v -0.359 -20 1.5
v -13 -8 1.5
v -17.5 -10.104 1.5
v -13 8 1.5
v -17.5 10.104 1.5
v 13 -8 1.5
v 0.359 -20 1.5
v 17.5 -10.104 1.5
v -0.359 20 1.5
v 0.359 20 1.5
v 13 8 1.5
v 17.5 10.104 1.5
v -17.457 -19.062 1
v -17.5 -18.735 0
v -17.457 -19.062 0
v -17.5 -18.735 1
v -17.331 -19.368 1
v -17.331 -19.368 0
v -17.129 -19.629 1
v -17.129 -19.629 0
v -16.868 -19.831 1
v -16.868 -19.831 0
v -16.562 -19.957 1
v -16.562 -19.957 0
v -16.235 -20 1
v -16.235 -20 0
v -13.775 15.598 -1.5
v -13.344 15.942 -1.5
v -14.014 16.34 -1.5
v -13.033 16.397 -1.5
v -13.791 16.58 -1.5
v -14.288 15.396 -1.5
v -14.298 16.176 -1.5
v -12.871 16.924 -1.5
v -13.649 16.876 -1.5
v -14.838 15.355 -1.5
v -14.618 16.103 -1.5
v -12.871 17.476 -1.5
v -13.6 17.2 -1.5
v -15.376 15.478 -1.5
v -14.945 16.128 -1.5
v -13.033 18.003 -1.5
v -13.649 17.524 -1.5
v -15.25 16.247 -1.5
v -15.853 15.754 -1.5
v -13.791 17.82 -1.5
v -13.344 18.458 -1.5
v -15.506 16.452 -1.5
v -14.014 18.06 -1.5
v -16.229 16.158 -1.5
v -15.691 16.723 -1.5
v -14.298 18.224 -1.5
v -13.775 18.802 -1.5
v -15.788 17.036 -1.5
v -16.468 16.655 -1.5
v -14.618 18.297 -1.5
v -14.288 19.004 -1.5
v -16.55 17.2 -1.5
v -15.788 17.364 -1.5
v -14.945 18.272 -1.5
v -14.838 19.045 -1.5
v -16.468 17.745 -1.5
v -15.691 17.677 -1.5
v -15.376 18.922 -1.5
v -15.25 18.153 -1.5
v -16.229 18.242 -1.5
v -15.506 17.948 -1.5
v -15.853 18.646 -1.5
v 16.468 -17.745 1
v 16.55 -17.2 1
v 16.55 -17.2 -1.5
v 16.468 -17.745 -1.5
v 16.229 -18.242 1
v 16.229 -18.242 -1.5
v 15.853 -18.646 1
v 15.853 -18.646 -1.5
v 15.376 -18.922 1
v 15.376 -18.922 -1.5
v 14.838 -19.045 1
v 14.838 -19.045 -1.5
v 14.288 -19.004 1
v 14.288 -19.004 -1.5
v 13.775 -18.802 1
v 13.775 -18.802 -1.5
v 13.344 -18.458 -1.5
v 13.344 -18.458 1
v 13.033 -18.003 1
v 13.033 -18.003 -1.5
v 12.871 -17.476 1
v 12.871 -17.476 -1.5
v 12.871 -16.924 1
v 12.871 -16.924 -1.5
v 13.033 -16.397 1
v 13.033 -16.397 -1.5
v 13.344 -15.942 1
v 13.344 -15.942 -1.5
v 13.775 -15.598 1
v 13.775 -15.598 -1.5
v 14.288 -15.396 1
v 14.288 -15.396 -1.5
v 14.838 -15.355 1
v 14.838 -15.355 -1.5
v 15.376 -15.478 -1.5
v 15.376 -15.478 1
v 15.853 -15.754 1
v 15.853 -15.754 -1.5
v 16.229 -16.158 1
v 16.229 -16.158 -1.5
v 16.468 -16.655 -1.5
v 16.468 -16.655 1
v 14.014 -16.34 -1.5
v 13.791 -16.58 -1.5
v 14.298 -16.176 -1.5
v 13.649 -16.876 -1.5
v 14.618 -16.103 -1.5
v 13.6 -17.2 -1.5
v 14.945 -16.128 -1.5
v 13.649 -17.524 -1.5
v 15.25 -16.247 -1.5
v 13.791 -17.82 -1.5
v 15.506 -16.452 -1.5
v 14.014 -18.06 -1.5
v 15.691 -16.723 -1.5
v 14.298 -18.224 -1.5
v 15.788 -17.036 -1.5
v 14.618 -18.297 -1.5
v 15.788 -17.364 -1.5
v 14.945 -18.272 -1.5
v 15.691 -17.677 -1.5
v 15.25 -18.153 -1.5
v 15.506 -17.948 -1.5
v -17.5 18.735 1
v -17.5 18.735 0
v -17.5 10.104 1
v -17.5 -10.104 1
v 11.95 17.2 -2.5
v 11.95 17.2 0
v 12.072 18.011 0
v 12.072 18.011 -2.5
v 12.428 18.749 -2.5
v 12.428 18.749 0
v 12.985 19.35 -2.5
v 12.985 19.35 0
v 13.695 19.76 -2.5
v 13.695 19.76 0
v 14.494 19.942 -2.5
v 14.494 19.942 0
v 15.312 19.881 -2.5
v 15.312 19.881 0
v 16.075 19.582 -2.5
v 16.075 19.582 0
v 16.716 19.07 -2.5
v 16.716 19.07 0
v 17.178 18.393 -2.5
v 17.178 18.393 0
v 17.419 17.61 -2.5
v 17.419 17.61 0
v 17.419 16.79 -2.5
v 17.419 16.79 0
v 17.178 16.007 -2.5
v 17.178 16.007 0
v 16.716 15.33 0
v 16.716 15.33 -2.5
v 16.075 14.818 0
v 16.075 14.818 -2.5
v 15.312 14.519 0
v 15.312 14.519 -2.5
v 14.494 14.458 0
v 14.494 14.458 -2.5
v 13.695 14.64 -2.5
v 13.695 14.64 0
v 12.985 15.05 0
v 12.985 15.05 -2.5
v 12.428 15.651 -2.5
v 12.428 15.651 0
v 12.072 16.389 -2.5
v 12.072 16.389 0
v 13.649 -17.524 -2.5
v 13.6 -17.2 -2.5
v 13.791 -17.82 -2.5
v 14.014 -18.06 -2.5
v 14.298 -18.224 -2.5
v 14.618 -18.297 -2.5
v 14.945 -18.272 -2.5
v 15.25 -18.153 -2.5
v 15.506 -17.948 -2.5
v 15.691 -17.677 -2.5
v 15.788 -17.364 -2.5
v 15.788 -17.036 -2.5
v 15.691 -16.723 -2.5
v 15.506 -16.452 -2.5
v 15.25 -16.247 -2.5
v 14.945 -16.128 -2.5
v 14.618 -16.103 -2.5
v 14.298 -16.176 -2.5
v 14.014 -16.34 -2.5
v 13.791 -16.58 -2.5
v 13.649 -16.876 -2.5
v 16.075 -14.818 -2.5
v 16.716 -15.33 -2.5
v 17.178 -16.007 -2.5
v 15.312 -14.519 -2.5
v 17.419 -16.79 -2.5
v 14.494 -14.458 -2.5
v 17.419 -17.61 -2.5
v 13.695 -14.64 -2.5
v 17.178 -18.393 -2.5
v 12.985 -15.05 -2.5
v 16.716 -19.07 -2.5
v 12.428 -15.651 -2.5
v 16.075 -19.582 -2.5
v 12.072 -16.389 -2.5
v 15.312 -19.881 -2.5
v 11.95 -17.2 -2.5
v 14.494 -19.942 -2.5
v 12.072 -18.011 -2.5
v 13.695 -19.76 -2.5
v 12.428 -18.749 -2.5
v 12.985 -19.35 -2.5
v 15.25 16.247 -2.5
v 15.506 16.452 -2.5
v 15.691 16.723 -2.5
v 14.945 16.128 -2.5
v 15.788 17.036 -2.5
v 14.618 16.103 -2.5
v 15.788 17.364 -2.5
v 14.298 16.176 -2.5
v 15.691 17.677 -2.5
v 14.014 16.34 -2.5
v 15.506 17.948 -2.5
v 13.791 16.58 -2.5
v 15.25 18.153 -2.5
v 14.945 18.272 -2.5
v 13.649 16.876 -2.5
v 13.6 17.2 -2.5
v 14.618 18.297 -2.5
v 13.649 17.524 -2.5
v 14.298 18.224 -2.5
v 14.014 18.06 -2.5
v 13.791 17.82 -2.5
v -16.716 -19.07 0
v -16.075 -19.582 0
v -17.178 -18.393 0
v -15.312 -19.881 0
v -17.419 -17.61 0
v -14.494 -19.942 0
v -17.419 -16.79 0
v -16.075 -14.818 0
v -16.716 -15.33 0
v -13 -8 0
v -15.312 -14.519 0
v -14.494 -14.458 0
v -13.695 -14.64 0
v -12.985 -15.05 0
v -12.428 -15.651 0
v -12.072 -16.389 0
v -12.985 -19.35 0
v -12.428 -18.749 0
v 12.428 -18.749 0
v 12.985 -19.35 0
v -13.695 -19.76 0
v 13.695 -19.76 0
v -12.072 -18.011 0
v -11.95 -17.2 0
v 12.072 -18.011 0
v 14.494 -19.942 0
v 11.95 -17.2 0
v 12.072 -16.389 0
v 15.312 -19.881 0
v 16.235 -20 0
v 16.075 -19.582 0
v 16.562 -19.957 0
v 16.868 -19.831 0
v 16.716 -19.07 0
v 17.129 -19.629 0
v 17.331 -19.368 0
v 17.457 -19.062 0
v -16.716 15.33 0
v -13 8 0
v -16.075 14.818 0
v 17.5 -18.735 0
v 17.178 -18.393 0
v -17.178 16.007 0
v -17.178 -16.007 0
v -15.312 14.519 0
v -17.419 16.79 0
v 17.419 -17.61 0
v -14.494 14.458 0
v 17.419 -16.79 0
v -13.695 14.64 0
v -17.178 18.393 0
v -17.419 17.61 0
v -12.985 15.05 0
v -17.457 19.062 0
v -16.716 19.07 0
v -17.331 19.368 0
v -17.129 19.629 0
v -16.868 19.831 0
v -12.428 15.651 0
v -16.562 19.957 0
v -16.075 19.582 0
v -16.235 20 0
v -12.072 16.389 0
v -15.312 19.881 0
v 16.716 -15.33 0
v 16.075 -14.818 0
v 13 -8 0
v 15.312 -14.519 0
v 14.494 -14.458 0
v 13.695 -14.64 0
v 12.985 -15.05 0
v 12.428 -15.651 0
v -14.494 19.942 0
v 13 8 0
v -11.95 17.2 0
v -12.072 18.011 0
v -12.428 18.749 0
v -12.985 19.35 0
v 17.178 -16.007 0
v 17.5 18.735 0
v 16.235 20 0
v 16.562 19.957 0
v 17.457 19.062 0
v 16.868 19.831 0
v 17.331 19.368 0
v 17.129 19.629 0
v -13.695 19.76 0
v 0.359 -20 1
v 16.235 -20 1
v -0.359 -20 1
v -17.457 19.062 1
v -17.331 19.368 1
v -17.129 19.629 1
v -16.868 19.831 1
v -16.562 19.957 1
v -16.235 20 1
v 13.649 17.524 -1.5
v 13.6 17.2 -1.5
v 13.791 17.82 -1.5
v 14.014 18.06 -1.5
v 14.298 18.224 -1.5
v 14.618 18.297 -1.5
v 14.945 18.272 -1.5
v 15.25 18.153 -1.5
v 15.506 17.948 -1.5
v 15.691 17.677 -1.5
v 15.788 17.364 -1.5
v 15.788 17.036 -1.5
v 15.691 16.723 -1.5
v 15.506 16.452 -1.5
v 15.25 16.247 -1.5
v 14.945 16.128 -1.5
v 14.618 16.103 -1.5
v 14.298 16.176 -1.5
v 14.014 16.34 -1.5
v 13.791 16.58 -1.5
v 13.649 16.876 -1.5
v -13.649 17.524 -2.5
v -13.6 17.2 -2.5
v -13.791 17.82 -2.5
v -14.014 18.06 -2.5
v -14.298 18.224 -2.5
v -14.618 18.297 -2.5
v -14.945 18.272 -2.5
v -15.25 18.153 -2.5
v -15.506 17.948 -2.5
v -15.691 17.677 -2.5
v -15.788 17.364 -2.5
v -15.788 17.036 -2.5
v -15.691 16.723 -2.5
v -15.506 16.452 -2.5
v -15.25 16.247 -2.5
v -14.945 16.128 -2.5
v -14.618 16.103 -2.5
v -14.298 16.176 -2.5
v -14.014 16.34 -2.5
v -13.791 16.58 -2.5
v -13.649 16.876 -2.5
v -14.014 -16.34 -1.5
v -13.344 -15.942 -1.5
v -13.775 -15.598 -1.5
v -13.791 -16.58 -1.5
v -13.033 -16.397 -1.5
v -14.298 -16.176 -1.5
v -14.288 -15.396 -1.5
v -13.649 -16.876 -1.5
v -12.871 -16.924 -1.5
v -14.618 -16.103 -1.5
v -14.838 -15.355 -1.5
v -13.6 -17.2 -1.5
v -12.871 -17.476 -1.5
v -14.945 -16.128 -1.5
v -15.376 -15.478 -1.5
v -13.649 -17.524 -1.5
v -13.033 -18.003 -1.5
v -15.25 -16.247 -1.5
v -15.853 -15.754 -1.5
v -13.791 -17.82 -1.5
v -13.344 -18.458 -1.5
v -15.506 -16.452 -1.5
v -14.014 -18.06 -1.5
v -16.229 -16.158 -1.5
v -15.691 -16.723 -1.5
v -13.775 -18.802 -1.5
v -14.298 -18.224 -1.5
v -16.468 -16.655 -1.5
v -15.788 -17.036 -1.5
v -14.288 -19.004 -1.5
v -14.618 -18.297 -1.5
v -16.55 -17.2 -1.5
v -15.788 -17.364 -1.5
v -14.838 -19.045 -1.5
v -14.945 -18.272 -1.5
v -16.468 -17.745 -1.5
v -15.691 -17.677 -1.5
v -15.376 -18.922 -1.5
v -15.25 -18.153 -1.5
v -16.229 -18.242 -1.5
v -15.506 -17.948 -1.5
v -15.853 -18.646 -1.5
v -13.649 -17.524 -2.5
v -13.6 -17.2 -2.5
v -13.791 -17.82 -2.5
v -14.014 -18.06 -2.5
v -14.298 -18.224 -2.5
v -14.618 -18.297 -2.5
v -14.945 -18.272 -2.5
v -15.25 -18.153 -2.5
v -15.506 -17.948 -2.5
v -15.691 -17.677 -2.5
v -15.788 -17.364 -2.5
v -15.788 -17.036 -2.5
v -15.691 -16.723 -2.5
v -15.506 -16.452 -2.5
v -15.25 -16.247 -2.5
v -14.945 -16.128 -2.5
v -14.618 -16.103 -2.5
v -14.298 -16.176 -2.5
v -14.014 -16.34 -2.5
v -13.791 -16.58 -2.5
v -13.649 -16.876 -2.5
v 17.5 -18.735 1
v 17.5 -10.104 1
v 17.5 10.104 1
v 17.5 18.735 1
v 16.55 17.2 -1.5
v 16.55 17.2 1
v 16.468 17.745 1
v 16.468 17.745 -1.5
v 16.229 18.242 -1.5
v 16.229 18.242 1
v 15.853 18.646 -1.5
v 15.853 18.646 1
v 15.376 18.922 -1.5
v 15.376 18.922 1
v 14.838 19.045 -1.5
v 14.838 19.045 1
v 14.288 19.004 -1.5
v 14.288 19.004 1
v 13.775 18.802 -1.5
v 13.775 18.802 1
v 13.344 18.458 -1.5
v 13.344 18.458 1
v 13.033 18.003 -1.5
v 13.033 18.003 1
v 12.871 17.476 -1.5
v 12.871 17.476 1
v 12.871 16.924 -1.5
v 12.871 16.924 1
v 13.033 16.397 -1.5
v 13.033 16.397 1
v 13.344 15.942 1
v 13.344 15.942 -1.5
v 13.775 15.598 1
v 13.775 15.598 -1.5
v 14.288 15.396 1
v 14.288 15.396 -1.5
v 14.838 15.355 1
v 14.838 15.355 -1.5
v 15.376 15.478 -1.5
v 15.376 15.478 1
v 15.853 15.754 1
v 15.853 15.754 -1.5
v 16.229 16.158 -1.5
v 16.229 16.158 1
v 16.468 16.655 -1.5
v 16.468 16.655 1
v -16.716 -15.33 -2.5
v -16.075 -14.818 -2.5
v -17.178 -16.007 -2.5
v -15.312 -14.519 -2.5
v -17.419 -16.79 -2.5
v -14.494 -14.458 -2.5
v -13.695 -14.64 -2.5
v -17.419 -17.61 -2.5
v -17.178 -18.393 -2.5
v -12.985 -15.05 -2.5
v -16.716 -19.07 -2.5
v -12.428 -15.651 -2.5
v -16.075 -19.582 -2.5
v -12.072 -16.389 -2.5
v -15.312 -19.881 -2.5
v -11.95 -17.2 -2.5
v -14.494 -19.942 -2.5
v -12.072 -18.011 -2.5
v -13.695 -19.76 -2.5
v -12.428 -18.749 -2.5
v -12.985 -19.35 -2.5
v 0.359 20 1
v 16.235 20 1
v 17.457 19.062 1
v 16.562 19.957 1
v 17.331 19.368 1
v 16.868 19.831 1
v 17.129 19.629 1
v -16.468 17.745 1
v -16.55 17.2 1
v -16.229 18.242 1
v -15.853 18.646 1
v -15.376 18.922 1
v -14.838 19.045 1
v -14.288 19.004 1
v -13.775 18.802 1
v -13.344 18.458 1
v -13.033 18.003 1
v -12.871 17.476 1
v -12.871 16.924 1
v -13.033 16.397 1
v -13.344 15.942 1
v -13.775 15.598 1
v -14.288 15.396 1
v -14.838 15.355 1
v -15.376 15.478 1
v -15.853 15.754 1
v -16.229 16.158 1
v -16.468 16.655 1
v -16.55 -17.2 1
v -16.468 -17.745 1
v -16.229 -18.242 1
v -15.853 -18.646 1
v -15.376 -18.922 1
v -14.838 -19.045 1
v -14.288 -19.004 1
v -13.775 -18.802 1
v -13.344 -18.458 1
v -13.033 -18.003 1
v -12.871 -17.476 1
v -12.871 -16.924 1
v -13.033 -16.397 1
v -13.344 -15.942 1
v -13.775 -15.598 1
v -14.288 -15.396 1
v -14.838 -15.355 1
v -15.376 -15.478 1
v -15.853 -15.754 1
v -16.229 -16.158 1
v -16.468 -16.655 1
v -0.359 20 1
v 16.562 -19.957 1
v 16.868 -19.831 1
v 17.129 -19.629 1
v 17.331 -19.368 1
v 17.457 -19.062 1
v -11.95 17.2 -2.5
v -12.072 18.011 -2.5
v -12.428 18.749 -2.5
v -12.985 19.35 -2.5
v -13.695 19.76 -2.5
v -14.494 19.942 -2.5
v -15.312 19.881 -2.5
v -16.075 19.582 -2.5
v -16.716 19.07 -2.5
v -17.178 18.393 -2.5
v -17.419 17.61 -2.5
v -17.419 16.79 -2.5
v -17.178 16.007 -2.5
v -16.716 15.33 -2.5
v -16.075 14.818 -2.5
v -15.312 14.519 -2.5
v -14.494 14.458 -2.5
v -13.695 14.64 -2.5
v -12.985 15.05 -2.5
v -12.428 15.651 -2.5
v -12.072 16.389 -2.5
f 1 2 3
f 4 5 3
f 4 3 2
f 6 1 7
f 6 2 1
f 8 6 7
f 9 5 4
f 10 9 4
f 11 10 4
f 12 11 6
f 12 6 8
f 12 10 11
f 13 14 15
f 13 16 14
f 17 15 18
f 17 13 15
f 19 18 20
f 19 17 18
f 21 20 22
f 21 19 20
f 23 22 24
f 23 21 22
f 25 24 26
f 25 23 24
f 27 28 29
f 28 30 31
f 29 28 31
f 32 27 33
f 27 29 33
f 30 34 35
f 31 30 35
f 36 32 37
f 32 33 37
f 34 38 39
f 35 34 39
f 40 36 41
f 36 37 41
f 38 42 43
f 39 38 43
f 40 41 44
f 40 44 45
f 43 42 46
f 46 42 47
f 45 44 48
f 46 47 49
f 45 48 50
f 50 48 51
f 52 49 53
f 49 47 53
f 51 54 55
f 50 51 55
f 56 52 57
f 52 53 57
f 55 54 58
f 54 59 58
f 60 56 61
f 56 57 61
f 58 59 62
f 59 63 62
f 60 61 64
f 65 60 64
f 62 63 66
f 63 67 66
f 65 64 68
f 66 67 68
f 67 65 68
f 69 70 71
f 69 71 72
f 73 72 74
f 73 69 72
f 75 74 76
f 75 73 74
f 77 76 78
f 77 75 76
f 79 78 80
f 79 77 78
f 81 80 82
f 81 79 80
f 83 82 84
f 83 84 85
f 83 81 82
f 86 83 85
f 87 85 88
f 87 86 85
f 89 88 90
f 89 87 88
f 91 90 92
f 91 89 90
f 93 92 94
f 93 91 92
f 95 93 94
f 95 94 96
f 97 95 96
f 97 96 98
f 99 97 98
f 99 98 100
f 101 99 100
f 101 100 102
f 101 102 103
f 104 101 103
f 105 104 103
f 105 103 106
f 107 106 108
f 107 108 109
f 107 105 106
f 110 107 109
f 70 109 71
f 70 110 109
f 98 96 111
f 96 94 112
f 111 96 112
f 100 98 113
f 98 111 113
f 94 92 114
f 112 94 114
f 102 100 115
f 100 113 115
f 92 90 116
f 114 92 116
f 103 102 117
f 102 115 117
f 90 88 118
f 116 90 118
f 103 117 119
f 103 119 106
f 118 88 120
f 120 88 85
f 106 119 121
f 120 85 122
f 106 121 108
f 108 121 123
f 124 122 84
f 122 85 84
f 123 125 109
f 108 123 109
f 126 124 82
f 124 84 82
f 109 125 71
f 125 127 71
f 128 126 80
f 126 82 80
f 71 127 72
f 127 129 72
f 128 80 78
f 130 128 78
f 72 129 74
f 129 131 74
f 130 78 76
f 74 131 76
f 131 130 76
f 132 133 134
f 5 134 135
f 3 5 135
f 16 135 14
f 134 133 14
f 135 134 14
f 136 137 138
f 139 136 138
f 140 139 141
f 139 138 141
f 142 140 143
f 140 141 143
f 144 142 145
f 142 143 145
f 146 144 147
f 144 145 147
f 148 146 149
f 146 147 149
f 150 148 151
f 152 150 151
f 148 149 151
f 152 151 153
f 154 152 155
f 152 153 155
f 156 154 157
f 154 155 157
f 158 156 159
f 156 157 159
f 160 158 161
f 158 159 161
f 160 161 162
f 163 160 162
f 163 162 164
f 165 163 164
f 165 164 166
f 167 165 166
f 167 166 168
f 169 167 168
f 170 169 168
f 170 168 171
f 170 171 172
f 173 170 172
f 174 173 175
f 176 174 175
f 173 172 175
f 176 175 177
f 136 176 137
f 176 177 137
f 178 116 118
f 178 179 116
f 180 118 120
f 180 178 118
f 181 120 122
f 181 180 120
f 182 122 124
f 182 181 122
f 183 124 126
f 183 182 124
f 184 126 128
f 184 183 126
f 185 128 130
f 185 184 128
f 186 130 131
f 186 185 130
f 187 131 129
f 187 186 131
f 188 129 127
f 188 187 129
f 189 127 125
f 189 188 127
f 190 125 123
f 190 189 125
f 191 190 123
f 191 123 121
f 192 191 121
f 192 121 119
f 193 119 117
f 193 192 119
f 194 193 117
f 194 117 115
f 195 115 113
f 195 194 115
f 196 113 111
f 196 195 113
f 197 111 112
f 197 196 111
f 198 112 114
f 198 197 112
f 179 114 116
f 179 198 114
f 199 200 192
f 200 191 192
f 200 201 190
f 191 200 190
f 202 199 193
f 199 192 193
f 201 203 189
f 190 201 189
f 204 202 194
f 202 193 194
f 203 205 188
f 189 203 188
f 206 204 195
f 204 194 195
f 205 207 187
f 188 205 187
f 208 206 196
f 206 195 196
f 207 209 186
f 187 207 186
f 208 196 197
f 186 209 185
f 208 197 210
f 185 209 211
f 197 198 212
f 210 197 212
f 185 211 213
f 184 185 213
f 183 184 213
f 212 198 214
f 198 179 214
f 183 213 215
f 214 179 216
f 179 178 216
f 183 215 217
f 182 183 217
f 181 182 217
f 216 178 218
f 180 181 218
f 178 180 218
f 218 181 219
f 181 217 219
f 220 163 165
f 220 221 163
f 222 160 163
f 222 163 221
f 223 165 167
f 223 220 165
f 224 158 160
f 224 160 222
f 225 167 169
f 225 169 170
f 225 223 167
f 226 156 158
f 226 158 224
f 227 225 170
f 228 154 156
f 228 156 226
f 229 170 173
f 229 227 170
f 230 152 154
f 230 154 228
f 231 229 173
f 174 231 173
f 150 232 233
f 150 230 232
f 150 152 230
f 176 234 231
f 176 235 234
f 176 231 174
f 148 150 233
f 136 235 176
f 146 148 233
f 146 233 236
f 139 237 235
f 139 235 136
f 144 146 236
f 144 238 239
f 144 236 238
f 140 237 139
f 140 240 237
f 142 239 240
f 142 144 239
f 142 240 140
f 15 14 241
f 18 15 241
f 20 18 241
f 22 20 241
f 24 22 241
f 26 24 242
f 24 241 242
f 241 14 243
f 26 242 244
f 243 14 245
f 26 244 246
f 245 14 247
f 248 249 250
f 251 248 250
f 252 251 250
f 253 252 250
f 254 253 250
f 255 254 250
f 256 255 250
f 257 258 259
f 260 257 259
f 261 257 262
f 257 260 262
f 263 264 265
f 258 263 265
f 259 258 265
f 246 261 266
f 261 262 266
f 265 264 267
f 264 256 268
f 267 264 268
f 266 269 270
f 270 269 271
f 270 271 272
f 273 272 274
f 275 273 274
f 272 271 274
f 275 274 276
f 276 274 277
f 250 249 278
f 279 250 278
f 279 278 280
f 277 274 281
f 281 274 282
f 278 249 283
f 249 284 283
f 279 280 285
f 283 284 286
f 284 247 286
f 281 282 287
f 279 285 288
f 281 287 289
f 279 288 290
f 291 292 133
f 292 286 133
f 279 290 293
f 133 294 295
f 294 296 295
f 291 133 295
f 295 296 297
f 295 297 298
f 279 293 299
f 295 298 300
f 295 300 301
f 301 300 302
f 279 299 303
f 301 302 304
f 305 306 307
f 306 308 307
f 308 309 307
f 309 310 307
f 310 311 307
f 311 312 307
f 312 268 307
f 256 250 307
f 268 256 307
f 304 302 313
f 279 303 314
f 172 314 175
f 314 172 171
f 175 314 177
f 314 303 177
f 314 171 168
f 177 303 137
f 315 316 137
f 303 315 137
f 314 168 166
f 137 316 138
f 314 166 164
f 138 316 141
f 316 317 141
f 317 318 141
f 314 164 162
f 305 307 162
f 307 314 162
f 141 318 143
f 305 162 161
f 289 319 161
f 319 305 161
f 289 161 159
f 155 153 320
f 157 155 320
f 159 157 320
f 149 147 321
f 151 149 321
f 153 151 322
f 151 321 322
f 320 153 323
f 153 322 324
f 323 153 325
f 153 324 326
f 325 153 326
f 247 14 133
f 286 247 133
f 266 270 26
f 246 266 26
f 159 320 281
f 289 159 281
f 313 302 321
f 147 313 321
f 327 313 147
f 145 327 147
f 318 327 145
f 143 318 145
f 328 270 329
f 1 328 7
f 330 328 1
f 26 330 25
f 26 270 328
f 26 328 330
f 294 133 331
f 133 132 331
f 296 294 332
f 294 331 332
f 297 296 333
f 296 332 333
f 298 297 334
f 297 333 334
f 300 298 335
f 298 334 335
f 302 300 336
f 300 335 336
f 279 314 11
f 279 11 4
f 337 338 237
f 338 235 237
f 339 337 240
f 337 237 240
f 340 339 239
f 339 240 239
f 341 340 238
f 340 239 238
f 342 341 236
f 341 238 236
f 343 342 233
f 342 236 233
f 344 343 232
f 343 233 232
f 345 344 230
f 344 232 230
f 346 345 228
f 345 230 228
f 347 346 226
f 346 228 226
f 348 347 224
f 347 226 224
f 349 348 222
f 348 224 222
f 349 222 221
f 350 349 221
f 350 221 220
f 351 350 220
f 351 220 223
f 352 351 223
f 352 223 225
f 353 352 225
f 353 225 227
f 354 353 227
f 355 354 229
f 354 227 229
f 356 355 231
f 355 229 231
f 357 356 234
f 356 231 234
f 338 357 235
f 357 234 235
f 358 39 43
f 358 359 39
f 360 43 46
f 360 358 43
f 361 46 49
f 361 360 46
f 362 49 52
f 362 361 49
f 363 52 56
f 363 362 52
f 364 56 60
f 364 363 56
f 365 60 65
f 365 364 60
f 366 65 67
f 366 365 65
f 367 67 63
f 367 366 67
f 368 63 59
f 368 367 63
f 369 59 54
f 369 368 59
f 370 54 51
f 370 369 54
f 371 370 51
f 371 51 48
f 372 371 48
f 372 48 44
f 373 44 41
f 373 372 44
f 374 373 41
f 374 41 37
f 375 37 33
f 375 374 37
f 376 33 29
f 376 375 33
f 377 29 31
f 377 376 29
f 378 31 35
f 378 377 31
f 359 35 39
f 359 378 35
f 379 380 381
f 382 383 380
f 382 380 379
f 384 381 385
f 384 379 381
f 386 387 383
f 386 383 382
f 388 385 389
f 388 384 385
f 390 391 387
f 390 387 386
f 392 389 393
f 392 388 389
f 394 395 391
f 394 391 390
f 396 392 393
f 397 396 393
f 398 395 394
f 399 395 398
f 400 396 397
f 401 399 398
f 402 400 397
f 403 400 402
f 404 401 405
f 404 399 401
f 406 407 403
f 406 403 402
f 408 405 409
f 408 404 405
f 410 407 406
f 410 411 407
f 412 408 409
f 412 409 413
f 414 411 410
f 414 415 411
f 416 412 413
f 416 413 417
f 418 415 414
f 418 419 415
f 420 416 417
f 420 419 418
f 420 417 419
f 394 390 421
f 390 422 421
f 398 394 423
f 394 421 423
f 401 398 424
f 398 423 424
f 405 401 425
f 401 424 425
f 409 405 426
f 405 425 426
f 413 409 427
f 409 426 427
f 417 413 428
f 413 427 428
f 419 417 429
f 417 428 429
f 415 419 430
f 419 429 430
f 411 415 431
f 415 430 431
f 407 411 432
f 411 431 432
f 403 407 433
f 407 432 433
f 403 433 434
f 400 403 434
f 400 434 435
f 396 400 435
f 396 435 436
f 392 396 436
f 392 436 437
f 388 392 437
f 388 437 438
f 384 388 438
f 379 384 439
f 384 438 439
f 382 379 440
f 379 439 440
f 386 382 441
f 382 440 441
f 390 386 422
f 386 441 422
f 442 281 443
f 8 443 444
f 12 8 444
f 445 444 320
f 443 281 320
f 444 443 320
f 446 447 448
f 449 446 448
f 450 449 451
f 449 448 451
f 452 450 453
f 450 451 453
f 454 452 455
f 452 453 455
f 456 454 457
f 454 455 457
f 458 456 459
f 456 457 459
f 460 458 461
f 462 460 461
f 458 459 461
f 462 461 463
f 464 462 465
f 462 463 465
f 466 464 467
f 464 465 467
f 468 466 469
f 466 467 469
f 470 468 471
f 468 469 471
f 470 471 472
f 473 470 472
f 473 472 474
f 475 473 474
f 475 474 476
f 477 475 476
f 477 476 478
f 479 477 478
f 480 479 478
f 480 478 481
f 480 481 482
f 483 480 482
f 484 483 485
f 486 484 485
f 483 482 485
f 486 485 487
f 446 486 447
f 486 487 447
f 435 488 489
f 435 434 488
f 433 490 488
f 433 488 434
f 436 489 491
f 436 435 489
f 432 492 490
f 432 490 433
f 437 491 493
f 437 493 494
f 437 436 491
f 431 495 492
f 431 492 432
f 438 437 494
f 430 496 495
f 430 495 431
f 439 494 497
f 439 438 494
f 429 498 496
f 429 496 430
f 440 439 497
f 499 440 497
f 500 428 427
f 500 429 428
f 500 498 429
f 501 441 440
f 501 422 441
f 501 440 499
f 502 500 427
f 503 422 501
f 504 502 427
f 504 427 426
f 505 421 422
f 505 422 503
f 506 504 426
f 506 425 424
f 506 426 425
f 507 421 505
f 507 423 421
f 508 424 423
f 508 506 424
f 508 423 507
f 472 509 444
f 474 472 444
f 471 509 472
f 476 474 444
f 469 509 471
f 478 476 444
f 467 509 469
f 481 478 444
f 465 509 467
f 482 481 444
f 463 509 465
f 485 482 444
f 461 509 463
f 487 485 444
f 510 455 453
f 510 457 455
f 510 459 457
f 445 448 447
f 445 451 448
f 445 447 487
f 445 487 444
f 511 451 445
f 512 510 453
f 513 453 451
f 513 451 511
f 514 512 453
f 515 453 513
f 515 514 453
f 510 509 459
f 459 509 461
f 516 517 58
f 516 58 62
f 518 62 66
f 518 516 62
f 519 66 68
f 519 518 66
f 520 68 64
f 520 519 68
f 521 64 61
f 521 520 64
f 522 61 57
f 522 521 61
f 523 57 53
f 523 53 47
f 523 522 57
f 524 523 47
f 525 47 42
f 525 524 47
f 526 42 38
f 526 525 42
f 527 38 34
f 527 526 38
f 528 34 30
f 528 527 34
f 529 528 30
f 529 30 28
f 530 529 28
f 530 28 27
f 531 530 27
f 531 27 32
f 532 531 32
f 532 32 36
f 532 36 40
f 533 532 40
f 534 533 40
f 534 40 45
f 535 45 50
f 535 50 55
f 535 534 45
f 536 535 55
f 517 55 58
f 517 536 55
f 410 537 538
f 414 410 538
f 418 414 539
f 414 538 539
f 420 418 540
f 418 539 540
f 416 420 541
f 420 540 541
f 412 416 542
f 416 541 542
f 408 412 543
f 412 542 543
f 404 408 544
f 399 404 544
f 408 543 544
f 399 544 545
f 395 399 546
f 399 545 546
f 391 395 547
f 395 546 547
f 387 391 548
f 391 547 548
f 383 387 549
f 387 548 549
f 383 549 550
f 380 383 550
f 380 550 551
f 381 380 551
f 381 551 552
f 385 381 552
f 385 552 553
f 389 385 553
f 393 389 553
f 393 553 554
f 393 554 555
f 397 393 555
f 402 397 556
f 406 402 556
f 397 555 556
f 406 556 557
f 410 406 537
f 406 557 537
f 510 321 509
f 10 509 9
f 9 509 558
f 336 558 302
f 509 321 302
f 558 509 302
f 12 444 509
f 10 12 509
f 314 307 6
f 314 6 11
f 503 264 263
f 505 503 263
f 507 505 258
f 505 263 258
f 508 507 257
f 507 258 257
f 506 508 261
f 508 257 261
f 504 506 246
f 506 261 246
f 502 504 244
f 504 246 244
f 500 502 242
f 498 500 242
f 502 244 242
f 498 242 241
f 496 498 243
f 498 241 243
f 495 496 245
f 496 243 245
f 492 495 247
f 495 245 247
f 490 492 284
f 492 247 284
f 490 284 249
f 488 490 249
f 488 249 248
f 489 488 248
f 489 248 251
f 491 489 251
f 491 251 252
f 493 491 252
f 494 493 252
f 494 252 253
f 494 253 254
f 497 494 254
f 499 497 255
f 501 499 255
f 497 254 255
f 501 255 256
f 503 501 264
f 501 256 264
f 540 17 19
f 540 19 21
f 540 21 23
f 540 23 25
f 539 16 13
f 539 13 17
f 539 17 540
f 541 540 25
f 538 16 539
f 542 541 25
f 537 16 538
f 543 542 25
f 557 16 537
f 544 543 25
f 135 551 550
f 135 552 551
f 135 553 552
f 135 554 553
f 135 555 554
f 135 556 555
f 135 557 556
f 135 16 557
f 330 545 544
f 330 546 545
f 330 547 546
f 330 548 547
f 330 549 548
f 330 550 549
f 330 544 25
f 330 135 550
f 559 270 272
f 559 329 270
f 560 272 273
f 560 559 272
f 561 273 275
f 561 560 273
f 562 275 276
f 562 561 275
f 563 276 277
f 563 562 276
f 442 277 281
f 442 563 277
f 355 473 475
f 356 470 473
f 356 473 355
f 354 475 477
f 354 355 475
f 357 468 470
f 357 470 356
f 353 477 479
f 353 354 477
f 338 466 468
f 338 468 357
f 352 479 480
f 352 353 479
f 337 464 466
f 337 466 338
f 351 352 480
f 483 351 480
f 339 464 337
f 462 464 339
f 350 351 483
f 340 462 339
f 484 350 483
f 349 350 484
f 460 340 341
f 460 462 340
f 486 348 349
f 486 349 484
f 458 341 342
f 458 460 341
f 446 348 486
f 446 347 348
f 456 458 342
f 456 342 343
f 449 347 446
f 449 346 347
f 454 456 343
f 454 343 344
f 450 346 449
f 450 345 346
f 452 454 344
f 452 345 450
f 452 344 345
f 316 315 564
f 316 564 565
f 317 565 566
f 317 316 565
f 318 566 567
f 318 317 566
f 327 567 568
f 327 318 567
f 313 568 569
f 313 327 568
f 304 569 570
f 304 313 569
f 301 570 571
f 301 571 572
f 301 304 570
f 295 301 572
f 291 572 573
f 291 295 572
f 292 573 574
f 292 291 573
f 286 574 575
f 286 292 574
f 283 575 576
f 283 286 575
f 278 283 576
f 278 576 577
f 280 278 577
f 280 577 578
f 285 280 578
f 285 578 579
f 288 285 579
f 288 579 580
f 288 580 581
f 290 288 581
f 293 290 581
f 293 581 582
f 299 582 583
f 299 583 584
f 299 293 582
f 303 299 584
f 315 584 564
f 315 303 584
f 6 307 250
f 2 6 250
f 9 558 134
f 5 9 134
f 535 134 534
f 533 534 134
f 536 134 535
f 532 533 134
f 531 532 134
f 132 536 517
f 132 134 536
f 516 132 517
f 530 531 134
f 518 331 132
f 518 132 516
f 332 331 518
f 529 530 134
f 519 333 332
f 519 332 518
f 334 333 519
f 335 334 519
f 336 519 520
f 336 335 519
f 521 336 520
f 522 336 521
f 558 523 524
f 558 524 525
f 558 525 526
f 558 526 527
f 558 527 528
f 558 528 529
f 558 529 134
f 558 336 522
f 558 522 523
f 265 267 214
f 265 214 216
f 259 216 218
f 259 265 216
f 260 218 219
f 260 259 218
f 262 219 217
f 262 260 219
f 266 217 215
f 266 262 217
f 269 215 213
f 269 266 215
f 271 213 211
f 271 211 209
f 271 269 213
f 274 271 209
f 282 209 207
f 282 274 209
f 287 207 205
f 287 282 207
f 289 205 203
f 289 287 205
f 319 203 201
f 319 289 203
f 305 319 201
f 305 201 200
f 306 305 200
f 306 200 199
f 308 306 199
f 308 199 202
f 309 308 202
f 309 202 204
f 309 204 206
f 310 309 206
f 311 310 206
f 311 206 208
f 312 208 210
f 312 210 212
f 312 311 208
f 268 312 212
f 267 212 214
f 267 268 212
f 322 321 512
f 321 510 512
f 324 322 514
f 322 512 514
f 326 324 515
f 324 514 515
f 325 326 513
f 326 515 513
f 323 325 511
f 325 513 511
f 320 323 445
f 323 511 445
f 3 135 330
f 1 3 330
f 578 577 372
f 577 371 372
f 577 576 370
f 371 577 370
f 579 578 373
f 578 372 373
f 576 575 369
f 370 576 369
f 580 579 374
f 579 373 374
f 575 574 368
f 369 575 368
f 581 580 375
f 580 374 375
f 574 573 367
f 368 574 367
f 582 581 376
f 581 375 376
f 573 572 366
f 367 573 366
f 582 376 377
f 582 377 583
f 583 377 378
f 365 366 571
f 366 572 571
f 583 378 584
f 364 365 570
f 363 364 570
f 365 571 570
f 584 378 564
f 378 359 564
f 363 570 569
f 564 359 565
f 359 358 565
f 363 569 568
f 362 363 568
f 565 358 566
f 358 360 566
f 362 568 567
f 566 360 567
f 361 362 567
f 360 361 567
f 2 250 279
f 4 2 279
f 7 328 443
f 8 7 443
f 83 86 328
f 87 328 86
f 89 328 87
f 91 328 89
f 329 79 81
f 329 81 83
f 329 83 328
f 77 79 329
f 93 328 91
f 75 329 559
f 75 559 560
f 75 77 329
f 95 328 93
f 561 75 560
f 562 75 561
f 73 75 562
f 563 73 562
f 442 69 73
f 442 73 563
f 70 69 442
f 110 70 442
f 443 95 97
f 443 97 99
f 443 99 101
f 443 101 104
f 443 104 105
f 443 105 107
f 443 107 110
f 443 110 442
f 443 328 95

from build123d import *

# Parameters (mm, degrees)
SKETCH_1_W                = 35
SKETCH_1_H                = 40
EXTRUDE_1_DEPTH           = 1
SKETCH_2_R                = 2.75
EXTRUDE_2_DEPTH           = 2.5
SKETCH_3_R                = 1.85
CUT_EXTRUDE_1_DEPTH       = 2.5
SKETCH_4_R                = 1.1
CUT_EXTRUDE_2_DEPTH       = 2
FILLET_1_R                = 1.265
MIRROR_9_COPY_1_SKETCH_R  = 2.75
MIRROR_9_COPY_1_DEPTH     = 2.5
MIRROR_11_COPY_1_SKETCH_R = 1.1
MIRROR_11_COPY_1_DEPTH    = 2
MIRROR_13_COPY_1_SKETCH_R = 1.85
MIRROR_13_COPY_1_DEPTH    = 2.5
SKETCH_5_W                = 26
SKETCH_5_H                = 16
CUT_EXTRUDE_3_DEPTH       = 5
EXTRUDE_16_DEPTH          = 0.5
SKETCH_11_W               = 26
SKETCH_11_H               = 16
CUT_EXTRUDE_4_DEPTH       = 5
CUT_EXTRUDE_5_DEPTH       = 5


with BuildPart() as part:
    # 草图1 → 凸台-拉伸1 (new body)
    with BuildSketch(Plane.XY):
        Rectangle(SKETCH_1_W, SKETCH_1_H)
    extrude(amount=EXTRUDE_1_DEPTH)

    # 草图2 → 凸台-拉伸2 (add)
    with BuildSketch(Plane(origin=(0, 0, 0), x_dir=(-1, 0, 0), z_dir=(0, 0, -1))):
        with Locations((-14.7, 17.2)):
            Circle(SKETCH_2_R)
    extrude_2 = extrude(amount=EXTRUDE_2_DEPTH)

    # 草图3 → 切除-拉伸1 (cut)
    with BuildSketch(Plane.XY.offset(1)):
        with Locations((14.7, 17.2)):
            Circle(SKETCH_3_R)
    cut_extrude_1 = extrude(amount=-CUT_EXTRUDE_1_DEPTH, mode=Mode.SUBTRACT)

    # 草图4 → 切除-拉伸2 (cut, symmetric)
    with BuildSketch(Plane(origin=(0, 0, -2.5), x_dir=(-1, 0, 0), z_dir=(0, 0, -1))):
        with Locations((-14.7, 17.2)):
            Circle(SKETCH_4_R)
    cut_extrude_2 = extrude(amount=CUT_EXTRUDE_2_DEPTH, both=True, mode=Mode.SUBTRACT)

    # 圆角1
    fillet_1_edges = [part.edges().sort_by_distance(p)[0] for p in [
        (-17.5, 20, 0.5),
        (17.5, 20, 0.5),
        (17.5, -20, 0.5),
        (-17.5, -20, 0.5),
    ]]
    fillet(fillet_1_edges, radius=FILLET_1_R)

    # 镜向8: 凸台-拉伸2 across plane
    add(extrude_2.mirror(Plane(origin=(0, 0, 0), x_dir=(0, 0, 1), z_dir=(1, 0, 0))))

    # 镜向9: 凸台-拉伸2 across plane
    add(extrude_2.mirror(Plane.ZX))

    # 镜向9 copy 1 sketch → 镜向9 copy 1 (add)
    with BuildSketch(Plane(origin=(0, 0, 0), x_dir=(1, 0, 0), z_dir=(0, 0, -1))):
        with Locations((-14.7, 17.2)):
            Circle(MIRROR_9_COPY_1_SKETCH_R)
    extrude(amount=MIRROR_9_COPY_1_DEPTH)

    # 镜向10: 切除-拉伸2 across plane
    add(cut_extrude_2.mirror(Plane.ZX), mode=Mode.SUBTRACT)

    # 镜向11: 切除-拉伸2 across plane
    add(cut_extrude_2.mirror(Plane(origin=(0, 0, 0), x_dir=(0, 0, 1), z_dir=(1, 0, 0))), mode=Mode.SUBTRACT)

    # 镜向11 copy 1 sketch → 镜向11 copy 1 (cut, symmetric)
    with BuildSketch(Plane(origin=(0, 0, -2.5), x_dir=(1, 0, 0), z_dir=(0, 0, -1))):
        with Locations((-14.7, 17.2)):
            Circle(MIRROR_11_COPY_1_SKETCH_R)
    extrude(amount=MIRROR_11_COPY_1_DEPTH, both=True, mode=Mode.SUBTRACT)

    # 镜向12: 切除-拉伸1 across plane
    add(cut_extrude_1.mirror(Plane(origin=(0, 0, 0), x_dir=(0, 0, 1), z_dir=(1, 0, 0))), mode=Mode.SUBTRACT)

    # 镜向13: 切除-拉伸1 across plane
    add(cut_extrude_1.mirror(Plane.ZX), mode=Mode.SUBTRACT)

    # 镜向13 copy 1 sketch → 镜向13 copy 1 (cut)
    with BuildSketch(Plane(origin=(0, 0, 1), x_dir=(-1, 0, 0), z_dir=(0, 0, 1))):
        with Locations((14.7, 17.2)):
            Circle(MIRROR_13_COPY_1_SKETCH_R)
    extrude(amount=-MIRROR_13_COPY_1_DEPTH, mode=Mode.SUBTRACT)

    # 草图5 → 切除-拉伸3 (cut, symmetric)
    with BuildSketch(Plane.XY.offset(1)):
        Rectangle(SKETCH_5_W, SKETCH_5_H)
    extrude(amount=CUT_EXTRUDE_3_DEPTH, both=True, mode=Mode.SUBTRACT)

    # 草图10 → 凸台-拉伸16 (add)
    with BuildSketch(Plane.XY.offset(1)):
        Polygon((0, 20.207259422), (-17.5, 10.103629711), (-17.5, -10.103629711), (0, -20.207259422), (17.5, -10.103629711), (17.5, 10.103629711), align=None)
    extrude(amount=EXTRUDE_16_DEPTH)

    # 草图11 → 切除-拉伸4 (cut)
    with BuildSketch(Plane(origin=(0, 0, 1), x_dir=(-1, 0, 0), z_dir=(0, 0, -1))):
        Rectangle(SKETCH_11_W, SKETCH_11_H)
    extrude(amount=-CUT_EXTRUDE_4_DEPTH, mode=Mode.SUBTRACT)

    # 草图12 → 切除-拉伸5 (cut)
    with BuildSketch(Plane(origin=(0, 0, 1), x_dir=(-1, 0, 0), z_dir=(0, 0, -1))):
        Polygon((-0.358983849, 20), (0.358983849, 20), (0, 20.207259422), align=None)
    cut_extrude_5 = extrude(amount=-CUT_EXTRUDE_5_DEPTH, mode=Mode.SUBTRACT)

    # 镜向15: 切除-拉伸5 across plane
    add(cut_extrude_5.mirror(Plane.ZX), mode=Mode.SUBTRACT)


solid = part.part
